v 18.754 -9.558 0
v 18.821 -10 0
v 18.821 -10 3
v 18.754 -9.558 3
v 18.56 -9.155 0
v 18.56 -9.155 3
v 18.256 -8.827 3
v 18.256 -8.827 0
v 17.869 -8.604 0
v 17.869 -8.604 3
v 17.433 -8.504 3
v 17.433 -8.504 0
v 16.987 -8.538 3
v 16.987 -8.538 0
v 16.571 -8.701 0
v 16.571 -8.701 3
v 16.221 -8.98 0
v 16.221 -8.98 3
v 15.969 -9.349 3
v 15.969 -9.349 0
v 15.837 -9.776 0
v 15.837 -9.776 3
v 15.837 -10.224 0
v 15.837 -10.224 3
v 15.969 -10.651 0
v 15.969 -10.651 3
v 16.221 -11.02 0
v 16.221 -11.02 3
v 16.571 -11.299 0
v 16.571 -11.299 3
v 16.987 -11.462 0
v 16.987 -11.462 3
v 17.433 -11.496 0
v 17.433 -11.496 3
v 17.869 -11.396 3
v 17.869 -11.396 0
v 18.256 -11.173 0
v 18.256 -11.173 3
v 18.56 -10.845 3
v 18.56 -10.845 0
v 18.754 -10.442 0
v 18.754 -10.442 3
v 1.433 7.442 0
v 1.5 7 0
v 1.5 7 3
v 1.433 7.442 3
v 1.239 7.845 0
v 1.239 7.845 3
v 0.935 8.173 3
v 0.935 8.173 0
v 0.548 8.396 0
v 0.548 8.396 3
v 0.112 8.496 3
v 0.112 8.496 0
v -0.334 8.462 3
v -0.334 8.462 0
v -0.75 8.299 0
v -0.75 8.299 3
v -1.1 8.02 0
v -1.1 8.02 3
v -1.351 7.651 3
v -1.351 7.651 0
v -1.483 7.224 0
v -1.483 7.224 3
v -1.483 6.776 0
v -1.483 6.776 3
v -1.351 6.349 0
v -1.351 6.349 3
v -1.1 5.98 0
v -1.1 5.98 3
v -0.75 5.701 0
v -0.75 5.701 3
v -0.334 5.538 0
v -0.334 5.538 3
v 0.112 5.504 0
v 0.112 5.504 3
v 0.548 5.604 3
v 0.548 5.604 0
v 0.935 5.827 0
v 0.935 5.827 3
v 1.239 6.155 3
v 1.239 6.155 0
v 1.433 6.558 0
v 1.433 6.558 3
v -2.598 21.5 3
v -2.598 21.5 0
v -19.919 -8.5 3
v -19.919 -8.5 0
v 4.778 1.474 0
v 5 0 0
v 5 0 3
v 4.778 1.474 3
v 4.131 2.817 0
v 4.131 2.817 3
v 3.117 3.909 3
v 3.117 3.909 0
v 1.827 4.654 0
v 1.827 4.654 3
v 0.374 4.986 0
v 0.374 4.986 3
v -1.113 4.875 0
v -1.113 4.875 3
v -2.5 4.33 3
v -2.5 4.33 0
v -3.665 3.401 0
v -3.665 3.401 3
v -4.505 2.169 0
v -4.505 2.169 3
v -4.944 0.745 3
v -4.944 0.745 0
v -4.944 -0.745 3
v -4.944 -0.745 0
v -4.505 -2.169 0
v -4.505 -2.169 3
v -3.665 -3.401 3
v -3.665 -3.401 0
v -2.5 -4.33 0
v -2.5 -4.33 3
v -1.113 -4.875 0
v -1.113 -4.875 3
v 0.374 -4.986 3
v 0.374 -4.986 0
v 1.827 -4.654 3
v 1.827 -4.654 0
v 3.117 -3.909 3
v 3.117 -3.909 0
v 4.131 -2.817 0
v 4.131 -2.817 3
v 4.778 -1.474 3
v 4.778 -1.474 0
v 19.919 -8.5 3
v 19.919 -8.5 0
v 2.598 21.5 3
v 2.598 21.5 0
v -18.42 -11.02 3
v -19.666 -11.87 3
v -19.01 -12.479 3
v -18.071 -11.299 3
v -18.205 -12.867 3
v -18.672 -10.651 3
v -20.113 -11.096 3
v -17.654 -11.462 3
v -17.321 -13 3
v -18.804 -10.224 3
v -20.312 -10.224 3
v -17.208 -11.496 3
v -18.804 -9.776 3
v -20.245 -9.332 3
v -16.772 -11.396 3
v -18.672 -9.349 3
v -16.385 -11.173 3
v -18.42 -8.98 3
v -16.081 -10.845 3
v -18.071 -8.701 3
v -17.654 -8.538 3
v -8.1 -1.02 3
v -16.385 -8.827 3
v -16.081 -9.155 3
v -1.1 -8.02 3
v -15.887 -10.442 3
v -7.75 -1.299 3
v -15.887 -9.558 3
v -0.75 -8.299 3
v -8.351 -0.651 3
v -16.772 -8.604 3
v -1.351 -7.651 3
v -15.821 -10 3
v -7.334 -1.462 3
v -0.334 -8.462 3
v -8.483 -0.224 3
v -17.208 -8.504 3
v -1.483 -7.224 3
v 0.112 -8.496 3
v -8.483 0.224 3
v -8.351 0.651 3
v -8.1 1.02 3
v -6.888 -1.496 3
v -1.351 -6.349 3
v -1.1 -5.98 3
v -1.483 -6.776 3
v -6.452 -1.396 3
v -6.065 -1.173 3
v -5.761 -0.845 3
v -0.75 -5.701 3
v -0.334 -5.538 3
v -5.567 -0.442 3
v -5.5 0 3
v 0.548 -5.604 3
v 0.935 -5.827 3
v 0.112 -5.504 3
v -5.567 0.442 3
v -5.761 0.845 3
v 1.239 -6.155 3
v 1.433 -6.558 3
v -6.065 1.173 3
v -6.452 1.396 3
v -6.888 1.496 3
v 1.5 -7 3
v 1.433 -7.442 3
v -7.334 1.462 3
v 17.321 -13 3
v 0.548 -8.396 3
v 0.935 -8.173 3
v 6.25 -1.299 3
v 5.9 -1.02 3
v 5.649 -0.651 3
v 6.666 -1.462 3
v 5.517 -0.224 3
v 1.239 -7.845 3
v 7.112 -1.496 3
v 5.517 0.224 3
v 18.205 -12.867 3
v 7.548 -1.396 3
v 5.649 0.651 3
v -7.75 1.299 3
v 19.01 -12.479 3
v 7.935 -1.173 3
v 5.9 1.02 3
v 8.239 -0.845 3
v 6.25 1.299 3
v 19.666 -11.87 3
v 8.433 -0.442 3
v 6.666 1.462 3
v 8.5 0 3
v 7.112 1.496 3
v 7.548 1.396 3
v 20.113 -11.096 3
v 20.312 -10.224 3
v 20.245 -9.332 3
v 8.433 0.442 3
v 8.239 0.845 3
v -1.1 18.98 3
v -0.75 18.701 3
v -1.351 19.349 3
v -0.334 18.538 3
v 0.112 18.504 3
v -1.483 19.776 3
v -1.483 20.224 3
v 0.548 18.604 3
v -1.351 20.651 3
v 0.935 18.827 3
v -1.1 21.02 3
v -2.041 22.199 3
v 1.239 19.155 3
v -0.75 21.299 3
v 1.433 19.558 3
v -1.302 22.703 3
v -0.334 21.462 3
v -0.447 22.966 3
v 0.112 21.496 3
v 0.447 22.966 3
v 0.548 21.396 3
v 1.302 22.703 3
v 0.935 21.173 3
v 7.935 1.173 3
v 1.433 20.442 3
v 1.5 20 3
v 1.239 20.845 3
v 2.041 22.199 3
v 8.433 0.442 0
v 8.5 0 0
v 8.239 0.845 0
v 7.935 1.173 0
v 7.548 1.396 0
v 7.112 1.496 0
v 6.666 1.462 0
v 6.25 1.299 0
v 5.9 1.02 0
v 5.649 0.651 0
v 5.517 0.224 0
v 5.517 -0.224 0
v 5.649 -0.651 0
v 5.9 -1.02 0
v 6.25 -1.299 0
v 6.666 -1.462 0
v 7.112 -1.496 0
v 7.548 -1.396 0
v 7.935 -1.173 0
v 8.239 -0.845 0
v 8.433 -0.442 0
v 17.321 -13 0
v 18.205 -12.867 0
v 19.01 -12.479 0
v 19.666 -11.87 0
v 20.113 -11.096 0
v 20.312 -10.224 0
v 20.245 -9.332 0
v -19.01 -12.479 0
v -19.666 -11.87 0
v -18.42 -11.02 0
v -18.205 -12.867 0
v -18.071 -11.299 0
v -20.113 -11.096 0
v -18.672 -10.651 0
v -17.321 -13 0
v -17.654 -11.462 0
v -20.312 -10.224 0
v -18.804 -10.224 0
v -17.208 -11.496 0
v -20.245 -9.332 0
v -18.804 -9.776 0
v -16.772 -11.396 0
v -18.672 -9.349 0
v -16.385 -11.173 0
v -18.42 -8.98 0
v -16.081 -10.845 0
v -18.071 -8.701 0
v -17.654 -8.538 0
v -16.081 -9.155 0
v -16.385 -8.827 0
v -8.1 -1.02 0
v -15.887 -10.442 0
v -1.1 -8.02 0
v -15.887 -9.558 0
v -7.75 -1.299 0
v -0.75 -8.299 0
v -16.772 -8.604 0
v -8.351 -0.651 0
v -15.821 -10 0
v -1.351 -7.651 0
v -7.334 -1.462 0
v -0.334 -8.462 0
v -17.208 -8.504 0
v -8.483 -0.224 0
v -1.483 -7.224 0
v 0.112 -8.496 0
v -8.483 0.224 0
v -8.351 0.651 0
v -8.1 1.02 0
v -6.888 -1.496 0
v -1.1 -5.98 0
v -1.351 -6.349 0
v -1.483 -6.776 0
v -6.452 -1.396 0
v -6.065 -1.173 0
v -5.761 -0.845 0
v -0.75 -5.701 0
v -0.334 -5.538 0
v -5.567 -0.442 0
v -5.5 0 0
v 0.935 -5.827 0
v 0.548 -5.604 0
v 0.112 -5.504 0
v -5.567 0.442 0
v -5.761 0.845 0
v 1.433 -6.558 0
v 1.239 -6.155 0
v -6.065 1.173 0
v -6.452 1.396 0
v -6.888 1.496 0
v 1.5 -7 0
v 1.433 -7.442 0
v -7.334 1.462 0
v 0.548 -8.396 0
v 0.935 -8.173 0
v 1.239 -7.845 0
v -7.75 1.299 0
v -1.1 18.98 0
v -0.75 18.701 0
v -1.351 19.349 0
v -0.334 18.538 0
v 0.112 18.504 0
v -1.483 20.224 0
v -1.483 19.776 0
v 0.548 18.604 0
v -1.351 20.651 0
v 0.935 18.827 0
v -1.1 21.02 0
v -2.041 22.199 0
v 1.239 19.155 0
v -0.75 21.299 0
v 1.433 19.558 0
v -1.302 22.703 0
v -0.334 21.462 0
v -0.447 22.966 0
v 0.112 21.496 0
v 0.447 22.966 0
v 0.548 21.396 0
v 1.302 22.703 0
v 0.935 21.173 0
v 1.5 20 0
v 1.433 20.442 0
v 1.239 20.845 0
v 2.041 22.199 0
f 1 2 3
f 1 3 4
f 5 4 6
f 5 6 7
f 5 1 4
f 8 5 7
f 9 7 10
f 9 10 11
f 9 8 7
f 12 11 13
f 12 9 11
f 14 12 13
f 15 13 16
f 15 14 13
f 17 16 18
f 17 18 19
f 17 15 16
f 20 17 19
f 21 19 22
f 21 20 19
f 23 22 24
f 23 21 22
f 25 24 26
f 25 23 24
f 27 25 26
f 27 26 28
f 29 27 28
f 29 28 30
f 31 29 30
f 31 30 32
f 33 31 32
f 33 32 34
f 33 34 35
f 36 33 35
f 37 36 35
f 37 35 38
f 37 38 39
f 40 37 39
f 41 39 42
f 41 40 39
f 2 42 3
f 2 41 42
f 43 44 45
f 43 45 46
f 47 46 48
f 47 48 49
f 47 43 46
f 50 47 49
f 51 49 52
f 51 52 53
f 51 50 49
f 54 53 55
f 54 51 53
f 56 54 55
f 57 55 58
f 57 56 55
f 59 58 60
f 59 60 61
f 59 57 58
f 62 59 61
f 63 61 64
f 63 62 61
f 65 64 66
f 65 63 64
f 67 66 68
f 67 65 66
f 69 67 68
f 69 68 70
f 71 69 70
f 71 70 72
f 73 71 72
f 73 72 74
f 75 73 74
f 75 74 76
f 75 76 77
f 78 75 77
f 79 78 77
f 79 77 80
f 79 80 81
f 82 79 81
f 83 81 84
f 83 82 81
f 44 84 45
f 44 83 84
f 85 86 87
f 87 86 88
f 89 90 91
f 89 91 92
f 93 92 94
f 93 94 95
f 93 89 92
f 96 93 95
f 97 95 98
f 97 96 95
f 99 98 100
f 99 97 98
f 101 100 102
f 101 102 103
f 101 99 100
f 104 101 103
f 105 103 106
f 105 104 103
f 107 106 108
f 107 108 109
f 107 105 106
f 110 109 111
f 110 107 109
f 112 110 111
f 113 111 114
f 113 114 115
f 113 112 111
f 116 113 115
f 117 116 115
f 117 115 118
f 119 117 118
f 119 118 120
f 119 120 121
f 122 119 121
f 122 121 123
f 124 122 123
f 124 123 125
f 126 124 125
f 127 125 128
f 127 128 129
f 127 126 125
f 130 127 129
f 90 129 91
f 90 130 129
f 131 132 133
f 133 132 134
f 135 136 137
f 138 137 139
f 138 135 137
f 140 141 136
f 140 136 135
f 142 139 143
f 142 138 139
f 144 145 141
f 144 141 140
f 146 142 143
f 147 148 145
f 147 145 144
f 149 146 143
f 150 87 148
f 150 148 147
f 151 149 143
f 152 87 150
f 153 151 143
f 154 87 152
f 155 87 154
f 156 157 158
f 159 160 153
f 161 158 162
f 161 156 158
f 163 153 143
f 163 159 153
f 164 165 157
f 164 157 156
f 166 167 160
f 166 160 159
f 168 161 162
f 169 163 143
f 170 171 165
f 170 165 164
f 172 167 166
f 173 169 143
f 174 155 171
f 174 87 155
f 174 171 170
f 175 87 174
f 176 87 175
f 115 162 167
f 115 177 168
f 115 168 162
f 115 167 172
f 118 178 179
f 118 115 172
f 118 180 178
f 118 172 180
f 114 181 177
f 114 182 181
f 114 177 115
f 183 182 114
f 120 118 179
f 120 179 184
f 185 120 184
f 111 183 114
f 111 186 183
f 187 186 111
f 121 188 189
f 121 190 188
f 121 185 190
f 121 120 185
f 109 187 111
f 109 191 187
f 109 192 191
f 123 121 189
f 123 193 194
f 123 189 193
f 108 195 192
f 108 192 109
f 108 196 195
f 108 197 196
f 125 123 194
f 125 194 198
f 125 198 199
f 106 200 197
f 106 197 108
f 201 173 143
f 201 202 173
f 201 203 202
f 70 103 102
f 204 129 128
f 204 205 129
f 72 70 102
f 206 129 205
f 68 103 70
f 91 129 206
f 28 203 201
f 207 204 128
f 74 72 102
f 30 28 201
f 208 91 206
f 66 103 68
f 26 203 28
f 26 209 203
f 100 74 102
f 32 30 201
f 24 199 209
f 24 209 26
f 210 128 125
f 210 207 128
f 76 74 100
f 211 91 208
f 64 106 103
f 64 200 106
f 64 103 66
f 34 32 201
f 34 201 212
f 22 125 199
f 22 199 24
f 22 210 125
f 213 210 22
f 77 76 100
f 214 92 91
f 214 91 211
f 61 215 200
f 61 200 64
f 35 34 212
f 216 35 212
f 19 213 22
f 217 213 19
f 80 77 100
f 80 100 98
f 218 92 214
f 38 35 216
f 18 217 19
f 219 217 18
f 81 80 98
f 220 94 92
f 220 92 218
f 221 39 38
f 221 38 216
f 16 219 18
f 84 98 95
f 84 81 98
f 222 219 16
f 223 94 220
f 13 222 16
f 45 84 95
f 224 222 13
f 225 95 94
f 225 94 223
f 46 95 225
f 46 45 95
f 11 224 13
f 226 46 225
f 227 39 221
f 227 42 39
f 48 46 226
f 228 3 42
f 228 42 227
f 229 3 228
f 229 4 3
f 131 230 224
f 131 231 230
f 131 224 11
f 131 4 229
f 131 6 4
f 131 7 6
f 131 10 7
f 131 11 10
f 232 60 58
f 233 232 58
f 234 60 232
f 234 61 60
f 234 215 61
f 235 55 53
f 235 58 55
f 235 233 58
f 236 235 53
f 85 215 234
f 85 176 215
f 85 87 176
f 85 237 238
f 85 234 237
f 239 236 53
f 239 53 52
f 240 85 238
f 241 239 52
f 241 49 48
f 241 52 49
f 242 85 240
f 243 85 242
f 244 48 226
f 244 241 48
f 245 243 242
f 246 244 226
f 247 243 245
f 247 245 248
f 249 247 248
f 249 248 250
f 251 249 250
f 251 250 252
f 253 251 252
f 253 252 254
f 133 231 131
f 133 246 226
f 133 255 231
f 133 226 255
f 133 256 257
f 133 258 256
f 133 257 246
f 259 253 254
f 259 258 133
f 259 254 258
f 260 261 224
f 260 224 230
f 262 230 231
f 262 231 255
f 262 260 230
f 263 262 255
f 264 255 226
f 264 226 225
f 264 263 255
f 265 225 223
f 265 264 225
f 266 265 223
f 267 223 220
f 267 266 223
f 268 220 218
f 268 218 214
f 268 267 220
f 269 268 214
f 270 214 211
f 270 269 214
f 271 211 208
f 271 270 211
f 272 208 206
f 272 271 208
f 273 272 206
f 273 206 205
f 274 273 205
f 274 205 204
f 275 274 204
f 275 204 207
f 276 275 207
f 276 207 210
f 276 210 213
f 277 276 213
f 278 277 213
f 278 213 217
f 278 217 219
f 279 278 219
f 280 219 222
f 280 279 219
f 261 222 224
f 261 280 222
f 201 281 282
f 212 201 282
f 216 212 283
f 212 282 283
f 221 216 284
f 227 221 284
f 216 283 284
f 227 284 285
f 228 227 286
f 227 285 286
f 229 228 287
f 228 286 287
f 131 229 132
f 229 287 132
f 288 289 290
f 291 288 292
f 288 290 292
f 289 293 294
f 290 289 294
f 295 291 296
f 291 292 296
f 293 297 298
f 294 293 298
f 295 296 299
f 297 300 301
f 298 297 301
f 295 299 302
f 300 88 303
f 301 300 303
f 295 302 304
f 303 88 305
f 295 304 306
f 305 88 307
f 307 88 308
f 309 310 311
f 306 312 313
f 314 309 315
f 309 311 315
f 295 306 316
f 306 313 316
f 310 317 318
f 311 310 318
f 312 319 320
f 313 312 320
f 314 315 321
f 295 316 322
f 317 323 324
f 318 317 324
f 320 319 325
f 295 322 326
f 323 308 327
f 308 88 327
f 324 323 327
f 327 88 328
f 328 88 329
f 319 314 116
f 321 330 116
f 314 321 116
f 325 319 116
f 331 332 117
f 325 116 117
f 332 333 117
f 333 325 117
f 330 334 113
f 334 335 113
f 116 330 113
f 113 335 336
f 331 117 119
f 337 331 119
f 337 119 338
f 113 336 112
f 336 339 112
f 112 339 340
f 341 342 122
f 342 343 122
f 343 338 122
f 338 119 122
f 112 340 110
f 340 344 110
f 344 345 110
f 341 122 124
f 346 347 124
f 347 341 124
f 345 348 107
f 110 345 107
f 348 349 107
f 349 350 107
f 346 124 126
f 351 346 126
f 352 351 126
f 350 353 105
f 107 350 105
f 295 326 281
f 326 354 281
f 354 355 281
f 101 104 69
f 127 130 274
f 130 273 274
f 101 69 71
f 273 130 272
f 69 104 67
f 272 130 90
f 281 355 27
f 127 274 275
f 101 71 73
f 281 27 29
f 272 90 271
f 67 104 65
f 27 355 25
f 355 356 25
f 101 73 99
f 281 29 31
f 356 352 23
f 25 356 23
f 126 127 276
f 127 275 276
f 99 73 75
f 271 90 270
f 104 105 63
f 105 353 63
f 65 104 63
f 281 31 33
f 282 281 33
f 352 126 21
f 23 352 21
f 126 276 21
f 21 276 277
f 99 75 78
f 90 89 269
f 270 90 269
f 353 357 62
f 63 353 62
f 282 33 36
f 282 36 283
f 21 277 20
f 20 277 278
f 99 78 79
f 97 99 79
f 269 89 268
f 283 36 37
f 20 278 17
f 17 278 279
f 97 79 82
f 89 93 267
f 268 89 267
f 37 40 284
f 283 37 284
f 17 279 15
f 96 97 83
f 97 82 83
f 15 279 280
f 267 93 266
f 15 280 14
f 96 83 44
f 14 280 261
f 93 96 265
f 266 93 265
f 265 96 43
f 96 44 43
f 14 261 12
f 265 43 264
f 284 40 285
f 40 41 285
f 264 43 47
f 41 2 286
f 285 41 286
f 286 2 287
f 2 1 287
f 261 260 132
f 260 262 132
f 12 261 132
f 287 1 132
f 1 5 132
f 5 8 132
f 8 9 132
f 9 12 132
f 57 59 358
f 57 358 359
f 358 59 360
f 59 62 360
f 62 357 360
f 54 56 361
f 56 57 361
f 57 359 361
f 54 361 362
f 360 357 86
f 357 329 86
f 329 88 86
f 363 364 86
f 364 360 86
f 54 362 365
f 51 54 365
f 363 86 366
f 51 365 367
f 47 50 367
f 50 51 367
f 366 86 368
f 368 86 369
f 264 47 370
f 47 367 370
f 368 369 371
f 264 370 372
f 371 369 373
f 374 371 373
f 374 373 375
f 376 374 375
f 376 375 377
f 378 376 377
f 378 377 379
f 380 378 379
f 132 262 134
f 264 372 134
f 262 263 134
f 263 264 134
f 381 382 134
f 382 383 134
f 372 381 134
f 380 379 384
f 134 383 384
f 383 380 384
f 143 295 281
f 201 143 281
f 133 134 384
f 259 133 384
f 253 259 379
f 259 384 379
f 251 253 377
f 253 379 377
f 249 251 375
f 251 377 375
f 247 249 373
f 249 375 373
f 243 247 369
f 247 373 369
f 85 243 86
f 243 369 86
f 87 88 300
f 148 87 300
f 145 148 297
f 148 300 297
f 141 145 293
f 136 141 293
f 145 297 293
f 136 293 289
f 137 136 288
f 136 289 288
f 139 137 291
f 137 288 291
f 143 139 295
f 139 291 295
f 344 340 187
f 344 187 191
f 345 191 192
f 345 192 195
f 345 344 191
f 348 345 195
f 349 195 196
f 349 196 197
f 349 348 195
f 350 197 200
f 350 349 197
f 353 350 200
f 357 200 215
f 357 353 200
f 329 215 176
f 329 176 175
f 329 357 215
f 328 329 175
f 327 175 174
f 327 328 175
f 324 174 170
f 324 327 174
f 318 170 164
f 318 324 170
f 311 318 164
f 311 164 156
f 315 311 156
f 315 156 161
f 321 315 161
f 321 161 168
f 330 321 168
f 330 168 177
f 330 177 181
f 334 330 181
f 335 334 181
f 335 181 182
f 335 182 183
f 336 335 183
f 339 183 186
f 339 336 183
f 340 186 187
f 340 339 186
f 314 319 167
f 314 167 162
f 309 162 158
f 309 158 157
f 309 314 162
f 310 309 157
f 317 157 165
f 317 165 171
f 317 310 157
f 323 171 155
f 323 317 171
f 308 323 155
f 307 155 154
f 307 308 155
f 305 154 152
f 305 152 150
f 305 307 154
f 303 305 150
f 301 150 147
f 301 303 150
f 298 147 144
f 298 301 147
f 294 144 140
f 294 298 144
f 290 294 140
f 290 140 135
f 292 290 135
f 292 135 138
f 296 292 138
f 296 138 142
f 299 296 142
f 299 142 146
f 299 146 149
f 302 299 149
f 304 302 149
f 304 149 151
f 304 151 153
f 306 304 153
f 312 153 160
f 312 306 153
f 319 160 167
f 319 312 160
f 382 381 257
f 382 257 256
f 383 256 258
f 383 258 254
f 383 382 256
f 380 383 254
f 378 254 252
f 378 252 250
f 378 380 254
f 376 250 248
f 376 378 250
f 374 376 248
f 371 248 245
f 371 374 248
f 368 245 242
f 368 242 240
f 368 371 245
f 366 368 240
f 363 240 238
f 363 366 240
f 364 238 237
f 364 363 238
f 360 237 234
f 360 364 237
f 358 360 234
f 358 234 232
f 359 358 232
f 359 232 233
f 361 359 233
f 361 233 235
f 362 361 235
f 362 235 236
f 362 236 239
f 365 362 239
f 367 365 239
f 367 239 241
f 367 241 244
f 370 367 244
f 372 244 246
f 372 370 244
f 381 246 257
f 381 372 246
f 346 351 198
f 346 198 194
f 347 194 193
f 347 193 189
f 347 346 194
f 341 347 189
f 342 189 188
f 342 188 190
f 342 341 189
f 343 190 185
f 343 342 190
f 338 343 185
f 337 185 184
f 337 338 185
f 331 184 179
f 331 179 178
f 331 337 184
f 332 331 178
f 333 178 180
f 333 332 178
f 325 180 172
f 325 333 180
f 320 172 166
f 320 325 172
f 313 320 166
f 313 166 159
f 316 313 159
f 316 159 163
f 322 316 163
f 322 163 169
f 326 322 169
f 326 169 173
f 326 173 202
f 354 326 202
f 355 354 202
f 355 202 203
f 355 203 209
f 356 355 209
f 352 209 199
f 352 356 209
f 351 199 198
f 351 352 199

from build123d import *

# Parameters (mm, degrees)
SKETCH_1_R      = 1.5
SKETCH_1_R_2    = 5
EXTRUDE_1_DEPTH = 3


with BuildPart() as part:
    # 草图1 → 凸台-拉伸1 (new body)
    with BuildSketch(Plane.XY):
        with BuildLine():
            Line((-2.598076211, 21.5), (-19.918584287, -8.5))
            ThreePointArc((-19.918584287, -8.5), (-19.918584287, -11.5), (-17.320508076, -13))
            Line((-17.320508076, -13), (17.320508076, -13))
            ThreePointArc((17.320508076, -13), (19.918584287, -11.5), (19.918584287, -8.5))
            Line((19.918584287, -8.5), (2.598076211, 21.5))
            ThreePointArc((2.598076211, 21.5), (0, 23), (-2.598076211, 21.5))
        make_face()
        with Locations((-17.320508076, -10)):
            Circle(SKETCH_1_R, mode=Mode.SUBTRACT)
        with Locations((0, 20)):
            Circle(SKETCH_1_R, mode=Mode.SUBTRACT)
        with Locations((17.320508076, -10)):
            Circle(SKETCH_1_R, mode=Mode.SUBTRACT)
        Circle(SKETCH_1_R_2, mode=Mode.SUBTRACT)
        with Locations((0, 7)):
            Circle(SKETCH_1_R, mode=Mode.SUBTRACT)
        with Locations((0, -7)):
            Circle(SKETCH_1_R, mode=Mode.SUBTRACT)
        with Locations((-7, 0)):
            Circle(SKETCH_1_R, mode=Mode.SUBTRACT)
        with Locations((7, 0)):
            Circle(SKETCH_1_R, mode=Mode.SUBTRACT)
    extrude(amount=EXTRUDE_1_DEPTH)


solid = part.part
